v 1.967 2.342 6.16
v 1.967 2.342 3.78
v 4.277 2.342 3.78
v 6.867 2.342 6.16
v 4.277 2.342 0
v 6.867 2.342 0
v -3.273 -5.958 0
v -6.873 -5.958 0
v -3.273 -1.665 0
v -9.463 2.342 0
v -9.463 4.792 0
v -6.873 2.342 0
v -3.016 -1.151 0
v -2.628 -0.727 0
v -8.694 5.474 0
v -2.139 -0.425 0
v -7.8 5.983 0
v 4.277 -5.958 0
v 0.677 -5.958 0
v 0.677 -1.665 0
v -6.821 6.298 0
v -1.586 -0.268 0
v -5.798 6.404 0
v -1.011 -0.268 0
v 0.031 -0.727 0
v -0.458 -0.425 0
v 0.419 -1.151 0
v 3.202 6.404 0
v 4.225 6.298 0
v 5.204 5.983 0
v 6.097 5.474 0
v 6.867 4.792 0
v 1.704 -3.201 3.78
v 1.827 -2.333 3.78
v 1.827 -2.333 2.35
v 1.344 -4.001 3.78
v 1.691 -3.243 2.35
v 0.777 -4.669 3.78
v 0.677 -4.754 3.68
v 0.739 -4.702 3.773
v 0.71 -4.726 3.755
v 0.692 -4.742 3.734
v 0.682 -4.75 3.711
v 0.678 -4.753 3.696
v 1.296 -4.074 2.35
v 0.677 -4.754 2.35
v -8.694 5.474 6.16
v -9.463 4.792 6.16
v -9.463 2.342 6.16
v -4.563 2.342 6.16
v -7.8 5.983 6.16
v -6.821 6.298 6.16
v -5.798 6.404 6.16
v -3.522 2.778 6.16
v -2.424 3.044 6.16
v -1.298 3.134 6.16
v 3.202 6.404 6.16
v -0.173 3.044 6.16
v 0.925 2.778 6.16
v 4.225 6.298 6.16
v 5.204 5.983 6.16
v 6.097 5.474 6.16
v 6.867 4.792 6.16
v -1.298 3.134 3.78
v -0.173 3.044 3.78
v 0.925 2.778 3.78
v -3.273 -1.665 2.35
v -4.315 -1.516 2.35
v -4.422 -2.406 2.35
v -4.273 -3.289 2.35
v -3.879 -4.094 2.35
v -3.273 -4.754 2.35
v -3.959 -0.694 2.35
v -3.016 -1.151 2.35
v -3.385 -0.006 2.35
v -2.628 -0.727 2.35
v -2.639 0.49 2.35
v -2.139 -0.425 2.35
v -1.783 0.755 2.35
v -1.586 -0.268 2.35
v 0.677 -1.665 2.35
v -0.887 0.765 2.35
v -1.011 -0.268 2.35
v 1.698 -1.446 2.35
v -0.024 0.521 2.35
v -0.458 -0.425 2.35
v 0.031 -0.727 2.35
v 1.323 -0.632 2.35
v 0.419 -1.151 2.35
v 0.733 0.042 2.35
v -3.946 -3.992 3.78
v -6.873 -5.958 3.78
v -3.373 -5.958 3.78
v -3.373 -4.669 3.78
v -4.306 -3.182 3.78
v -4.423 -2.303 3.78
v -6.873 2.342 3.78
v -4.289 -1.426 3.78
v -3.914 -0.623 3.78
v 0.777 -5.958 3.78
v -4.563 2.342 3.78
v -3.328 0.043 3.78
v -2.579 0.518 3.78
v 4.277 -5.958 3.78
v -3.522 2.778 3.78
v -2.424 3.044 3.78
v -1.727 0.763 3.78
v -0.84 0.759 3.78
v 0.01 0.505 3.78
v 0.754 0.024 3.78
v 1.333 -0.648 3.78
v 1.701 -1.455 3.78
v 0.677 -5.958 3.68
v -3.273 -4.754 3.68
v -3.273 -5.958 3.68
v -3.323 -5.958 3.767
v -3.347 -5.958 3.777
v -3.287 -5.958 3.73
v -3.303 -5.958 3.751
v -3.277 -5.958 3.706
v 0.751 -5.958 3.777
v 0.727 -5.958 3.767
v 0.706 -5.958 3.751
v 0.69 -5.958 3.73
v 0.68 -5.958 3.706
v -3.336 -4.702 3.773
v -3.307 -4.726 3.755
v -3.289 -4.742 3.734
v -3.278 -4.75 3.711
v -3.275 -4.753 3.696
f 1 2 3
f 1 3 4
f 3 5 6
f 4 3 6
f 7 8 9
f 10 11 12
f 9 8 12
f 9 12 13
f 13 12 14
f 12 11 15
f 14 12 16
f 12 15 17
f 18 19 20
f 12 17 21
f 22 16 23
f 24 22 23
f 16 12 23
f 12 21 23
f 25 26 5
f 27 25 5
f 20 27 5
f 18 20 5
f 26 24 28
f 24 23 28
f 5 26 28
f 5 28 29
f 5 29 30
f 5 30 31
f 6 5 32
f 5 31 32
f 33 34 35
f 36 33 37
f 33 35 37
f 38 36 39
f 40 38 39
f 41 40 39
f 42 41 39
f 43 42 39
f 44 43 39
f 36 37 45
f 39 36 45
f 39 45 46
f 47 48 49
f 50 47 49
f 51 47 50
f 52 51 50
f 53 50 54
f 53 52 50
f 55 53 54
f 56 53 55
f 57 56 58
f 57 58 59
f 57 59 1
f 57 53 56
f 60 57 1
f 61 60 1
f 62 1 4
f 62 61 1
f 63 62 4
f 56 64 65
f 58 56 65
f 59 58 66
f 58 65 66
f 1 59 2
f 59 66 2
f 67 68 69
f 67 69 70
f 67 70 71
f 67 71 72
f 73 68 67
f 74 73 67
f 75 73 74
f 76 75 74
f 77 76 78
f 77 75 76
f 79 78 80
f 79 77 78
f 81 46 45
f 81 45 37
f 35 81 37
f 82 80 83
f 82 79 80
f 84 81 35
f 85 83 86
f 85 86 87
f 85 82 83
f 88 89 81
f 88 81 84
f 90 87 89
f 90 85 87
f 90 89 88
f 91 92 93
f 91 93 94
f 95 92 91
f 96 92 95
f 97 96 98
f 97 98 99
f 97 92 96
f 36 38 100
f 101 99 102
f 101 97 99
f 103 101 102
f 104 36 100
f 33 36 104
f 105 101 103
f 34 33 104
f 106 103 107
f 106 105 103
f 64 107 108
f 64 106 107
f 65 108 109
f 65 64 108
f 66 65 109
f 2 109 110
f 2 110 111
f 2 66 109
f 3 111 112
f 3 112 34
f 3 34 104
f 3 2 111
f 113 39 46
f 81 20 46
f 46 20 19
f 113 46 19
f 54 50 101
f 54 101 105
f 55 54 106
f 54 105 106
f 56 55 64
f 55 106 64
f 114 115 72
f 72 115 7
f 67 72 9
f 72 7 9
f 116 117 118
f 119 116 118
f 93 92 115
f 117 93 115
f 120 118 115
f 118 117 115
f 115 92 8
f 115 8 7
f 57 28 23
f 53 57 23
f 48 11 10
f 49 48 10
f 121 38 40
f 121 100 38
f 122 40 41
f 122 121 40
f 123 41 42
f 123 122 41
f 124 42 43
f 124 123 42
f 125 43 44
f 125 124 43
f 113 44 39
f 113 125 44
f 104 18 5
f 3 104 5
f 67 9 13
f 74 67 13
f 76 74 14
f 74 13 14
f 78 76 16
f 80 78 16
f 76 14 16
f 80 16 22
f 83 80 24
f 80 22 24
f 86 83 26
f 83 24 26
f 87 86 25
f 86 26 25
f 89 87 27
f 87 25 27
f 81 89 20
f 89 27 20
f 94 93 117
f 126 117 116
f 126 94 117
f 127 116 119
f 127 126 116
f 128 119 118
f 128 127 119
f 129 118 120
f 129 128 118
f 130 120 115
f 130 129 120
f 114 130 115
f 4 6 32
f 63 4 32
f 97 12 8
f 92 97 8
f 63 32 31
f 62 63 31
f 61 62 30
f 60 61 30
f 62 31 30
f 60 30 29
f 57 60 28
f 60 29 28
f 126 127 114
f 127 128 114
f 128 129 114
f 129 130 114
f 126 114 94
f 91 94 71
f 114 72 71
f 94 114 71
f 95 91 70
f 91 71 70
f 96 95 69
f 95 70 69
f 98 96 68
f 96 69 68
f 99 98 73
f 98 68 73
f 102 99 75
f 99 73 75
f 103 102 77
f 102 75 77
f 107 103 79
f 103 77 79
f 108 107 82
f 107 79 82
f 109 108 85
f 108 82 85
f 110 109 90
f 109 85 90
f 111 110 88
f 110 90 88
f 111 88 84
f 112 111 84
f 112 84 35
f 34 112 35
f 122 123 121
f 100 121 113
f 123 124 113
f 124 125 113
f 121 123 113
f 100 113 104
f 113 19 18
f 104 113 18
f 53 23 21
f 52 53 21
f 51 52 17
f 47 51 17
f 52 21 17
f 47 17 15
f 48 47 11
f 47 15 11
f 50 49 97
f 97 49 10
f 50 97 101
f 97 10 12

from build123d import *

# Parameters (mm, degrees)
F1_DEPTH = 2.35
F2_DEPTH = 3.78
F3_DEPTH = 6.16
F4_R     = 0.1
F5_R     = 0.1


# Not quite as in the source:
# - a feature names something its author has since deleted; it is built from what else it names


with BuildPart() as f1:
    # F0 (on Top) → F1 (new body)
    with BuildSketch(Plane.XY):
        with BuildLine():
            Line((0.6766474014, -1.6654146139), (0.6766474014, -4.7543960131))
            ThreePointArc((0.6766474014, -4.7543960131), (1.524544849, -3.6730954673), (1.8266474014, -2.3326198054))
            ThreePointArc((1.8266474014, -2.3326198054), (-2.6388282605, 0.4902776422), (-3.2733525986, -4.7543960131))
            Line((-3.2733525986, -4.7543960131), (-3.2733525986, -1.6654146139))
            ThreePointArc((-3.2733525986, -1.6654146139), (-1.2983525986, -0.247964494), (0.6766474014, -1.6654146139))
        make_face()
    extrude(amount=F1_DEPTH)

    # F0 (on Top) → F2 (join)
    with BuildSketch(Plane.XY):
        with BuildLine():
            Line((4.2766474014, -5.9583943095), (4.2766474014, 2.3416056905))
            Line((4.2766474014, 2.3416056905), (1.9666474014, 2.3416056905))
            ThreePointArc((1.9666474014, 2.3416056905), (0.3815359204, 2.9330616855), (-1.2983525986, 3.1339924307))
            ThreePointArc((-1.2983525986, 3.1339924307), (-2.9782411177, 2.9330616855), (-4.5633525986, 2.3416056905))
            Line((-4.5633525986, 2.3416056905), (-6.8733525986, 2.3416056905))
            Line((-6.8733525986, 2.3416056905), (-6.8733525986, -5.9583943095))
            Line((-6.8733525986, -5.9583943095), (-3.2733525986, -5.9583943095))
            Line((-3.2733525986, -5.9583943095), (-3.2733525986, -4.7543960131))
            ThreePointArc((-3.2733525986, -4.7543960131), (-2.6388282605, 0.4902776422), (1.8266474014, -2.3326198054))
            ThreePointArc((1.8266474014, -2.3326198054), (1.524544849, -3.6730954673), (0.6766474014, -4.7543960131))
            Line((0.6766474014, -4.7543960131), (0.6766474014, -5.9583943095))
            Line((0.6766474014, -5.9583943095), (4.2766474014, -5.9583943095))
        make_face()
    extrude(amount=F2_DEPTH)

    # F0 (on Top) → F3 (join)
    with BuildSketch(Plane.XY):
        with BuildLine():
            ThreePointArc((-4.5633525986, 2.3416056905), (-2.9782411177, 2.9330616855), (-1.2983525986, 3.1339924307))
            Line((-1.2983525986, 3.1339924307), (-1.2983525986, 4.7916056905))
            Line((-1.2983525986, 4.7916056905), (-9.4633525986, 4.7916056905))
            Line((-9.4633525986, 4.7916056905), (-9.4633525986, 2.3416056905))
            Line((-9.4633525986, 2.3416056905), (-6.8733525986, 2.3416056905))
            Line((-6.8733525986, 2.3416056905), (-4.5633525986, 2.3416056905))
        make_face()
        with BuildLine():
            Line((1.9666474014, 2.3416056905), (4.2766474014, 2.3416056905))
            Line((4.2766474014, 2.3416056905), (6.8666474014, 2.3416056905))
            Line((6.8666474014, 2.3416056905), (6.8666474014, 4.7916056905))
            Line((6.8666474014, 4.7916056905), (-1.2983525986, 4.7916056905))
            Line((-1.2983525986, 4.7916056905), (-1.2983525986, 3.1339924307))
            ThreePointArc((-1.2983525986, 3.1339924307), (0.3815359204, 2.9330616855), (1.9666474014, 2.3416056905))
        make_face()
        with BuildLine():
            Line((-1.2983525986, 4.7916056905), (6.8666474014, 4.7916056905))
            ThreePointArc((6.8666474014, 4.7916056905), (5.2036474014, 5.9830772848), (3.2016474014, 6.4039924307))
            Line((3.2016474014, 6.4039924307), (-1.2983525986, 6.4039924307))
            Line((-1.2983525986, 6.4039924307), (-1.2983525986, 4.7916056905))
        make_face()
        with BuildLine():
            Line((-9.4633525986, 4.7916056905), (-1.2983525986, 4.7916056905))
            Line((-1.2983525986, 4.7916056905), (-1.2983525986, 6.4039924307))
            Line((-1.2983525986, 6.4039924307), (-5.7983525986, 6.4039924307))
            ThreePointArc((-5.7983525986, 6.4039924307), (-7.8003525986, 5.9830772848), (-9.4633525986, 4.7916056905))
        make_face()
    extrude(amount=F3_DEPTH)

    # F4
    f4_edges = [f1.edges().sort_by_distance(p)[0] for p in [
        (0.676647, -5.356395, 3.78),
    ]]
    fillet(f4_edges, radius=F4_R)

    # F5
    f5_edges = [f1.edges().sort_by_distance(p)[0] for p in [
        (-3.273353, -5.356395, 3.78),
    ]]
    fillet(f5_edges, radius=F5_R)


solid = f1.part
